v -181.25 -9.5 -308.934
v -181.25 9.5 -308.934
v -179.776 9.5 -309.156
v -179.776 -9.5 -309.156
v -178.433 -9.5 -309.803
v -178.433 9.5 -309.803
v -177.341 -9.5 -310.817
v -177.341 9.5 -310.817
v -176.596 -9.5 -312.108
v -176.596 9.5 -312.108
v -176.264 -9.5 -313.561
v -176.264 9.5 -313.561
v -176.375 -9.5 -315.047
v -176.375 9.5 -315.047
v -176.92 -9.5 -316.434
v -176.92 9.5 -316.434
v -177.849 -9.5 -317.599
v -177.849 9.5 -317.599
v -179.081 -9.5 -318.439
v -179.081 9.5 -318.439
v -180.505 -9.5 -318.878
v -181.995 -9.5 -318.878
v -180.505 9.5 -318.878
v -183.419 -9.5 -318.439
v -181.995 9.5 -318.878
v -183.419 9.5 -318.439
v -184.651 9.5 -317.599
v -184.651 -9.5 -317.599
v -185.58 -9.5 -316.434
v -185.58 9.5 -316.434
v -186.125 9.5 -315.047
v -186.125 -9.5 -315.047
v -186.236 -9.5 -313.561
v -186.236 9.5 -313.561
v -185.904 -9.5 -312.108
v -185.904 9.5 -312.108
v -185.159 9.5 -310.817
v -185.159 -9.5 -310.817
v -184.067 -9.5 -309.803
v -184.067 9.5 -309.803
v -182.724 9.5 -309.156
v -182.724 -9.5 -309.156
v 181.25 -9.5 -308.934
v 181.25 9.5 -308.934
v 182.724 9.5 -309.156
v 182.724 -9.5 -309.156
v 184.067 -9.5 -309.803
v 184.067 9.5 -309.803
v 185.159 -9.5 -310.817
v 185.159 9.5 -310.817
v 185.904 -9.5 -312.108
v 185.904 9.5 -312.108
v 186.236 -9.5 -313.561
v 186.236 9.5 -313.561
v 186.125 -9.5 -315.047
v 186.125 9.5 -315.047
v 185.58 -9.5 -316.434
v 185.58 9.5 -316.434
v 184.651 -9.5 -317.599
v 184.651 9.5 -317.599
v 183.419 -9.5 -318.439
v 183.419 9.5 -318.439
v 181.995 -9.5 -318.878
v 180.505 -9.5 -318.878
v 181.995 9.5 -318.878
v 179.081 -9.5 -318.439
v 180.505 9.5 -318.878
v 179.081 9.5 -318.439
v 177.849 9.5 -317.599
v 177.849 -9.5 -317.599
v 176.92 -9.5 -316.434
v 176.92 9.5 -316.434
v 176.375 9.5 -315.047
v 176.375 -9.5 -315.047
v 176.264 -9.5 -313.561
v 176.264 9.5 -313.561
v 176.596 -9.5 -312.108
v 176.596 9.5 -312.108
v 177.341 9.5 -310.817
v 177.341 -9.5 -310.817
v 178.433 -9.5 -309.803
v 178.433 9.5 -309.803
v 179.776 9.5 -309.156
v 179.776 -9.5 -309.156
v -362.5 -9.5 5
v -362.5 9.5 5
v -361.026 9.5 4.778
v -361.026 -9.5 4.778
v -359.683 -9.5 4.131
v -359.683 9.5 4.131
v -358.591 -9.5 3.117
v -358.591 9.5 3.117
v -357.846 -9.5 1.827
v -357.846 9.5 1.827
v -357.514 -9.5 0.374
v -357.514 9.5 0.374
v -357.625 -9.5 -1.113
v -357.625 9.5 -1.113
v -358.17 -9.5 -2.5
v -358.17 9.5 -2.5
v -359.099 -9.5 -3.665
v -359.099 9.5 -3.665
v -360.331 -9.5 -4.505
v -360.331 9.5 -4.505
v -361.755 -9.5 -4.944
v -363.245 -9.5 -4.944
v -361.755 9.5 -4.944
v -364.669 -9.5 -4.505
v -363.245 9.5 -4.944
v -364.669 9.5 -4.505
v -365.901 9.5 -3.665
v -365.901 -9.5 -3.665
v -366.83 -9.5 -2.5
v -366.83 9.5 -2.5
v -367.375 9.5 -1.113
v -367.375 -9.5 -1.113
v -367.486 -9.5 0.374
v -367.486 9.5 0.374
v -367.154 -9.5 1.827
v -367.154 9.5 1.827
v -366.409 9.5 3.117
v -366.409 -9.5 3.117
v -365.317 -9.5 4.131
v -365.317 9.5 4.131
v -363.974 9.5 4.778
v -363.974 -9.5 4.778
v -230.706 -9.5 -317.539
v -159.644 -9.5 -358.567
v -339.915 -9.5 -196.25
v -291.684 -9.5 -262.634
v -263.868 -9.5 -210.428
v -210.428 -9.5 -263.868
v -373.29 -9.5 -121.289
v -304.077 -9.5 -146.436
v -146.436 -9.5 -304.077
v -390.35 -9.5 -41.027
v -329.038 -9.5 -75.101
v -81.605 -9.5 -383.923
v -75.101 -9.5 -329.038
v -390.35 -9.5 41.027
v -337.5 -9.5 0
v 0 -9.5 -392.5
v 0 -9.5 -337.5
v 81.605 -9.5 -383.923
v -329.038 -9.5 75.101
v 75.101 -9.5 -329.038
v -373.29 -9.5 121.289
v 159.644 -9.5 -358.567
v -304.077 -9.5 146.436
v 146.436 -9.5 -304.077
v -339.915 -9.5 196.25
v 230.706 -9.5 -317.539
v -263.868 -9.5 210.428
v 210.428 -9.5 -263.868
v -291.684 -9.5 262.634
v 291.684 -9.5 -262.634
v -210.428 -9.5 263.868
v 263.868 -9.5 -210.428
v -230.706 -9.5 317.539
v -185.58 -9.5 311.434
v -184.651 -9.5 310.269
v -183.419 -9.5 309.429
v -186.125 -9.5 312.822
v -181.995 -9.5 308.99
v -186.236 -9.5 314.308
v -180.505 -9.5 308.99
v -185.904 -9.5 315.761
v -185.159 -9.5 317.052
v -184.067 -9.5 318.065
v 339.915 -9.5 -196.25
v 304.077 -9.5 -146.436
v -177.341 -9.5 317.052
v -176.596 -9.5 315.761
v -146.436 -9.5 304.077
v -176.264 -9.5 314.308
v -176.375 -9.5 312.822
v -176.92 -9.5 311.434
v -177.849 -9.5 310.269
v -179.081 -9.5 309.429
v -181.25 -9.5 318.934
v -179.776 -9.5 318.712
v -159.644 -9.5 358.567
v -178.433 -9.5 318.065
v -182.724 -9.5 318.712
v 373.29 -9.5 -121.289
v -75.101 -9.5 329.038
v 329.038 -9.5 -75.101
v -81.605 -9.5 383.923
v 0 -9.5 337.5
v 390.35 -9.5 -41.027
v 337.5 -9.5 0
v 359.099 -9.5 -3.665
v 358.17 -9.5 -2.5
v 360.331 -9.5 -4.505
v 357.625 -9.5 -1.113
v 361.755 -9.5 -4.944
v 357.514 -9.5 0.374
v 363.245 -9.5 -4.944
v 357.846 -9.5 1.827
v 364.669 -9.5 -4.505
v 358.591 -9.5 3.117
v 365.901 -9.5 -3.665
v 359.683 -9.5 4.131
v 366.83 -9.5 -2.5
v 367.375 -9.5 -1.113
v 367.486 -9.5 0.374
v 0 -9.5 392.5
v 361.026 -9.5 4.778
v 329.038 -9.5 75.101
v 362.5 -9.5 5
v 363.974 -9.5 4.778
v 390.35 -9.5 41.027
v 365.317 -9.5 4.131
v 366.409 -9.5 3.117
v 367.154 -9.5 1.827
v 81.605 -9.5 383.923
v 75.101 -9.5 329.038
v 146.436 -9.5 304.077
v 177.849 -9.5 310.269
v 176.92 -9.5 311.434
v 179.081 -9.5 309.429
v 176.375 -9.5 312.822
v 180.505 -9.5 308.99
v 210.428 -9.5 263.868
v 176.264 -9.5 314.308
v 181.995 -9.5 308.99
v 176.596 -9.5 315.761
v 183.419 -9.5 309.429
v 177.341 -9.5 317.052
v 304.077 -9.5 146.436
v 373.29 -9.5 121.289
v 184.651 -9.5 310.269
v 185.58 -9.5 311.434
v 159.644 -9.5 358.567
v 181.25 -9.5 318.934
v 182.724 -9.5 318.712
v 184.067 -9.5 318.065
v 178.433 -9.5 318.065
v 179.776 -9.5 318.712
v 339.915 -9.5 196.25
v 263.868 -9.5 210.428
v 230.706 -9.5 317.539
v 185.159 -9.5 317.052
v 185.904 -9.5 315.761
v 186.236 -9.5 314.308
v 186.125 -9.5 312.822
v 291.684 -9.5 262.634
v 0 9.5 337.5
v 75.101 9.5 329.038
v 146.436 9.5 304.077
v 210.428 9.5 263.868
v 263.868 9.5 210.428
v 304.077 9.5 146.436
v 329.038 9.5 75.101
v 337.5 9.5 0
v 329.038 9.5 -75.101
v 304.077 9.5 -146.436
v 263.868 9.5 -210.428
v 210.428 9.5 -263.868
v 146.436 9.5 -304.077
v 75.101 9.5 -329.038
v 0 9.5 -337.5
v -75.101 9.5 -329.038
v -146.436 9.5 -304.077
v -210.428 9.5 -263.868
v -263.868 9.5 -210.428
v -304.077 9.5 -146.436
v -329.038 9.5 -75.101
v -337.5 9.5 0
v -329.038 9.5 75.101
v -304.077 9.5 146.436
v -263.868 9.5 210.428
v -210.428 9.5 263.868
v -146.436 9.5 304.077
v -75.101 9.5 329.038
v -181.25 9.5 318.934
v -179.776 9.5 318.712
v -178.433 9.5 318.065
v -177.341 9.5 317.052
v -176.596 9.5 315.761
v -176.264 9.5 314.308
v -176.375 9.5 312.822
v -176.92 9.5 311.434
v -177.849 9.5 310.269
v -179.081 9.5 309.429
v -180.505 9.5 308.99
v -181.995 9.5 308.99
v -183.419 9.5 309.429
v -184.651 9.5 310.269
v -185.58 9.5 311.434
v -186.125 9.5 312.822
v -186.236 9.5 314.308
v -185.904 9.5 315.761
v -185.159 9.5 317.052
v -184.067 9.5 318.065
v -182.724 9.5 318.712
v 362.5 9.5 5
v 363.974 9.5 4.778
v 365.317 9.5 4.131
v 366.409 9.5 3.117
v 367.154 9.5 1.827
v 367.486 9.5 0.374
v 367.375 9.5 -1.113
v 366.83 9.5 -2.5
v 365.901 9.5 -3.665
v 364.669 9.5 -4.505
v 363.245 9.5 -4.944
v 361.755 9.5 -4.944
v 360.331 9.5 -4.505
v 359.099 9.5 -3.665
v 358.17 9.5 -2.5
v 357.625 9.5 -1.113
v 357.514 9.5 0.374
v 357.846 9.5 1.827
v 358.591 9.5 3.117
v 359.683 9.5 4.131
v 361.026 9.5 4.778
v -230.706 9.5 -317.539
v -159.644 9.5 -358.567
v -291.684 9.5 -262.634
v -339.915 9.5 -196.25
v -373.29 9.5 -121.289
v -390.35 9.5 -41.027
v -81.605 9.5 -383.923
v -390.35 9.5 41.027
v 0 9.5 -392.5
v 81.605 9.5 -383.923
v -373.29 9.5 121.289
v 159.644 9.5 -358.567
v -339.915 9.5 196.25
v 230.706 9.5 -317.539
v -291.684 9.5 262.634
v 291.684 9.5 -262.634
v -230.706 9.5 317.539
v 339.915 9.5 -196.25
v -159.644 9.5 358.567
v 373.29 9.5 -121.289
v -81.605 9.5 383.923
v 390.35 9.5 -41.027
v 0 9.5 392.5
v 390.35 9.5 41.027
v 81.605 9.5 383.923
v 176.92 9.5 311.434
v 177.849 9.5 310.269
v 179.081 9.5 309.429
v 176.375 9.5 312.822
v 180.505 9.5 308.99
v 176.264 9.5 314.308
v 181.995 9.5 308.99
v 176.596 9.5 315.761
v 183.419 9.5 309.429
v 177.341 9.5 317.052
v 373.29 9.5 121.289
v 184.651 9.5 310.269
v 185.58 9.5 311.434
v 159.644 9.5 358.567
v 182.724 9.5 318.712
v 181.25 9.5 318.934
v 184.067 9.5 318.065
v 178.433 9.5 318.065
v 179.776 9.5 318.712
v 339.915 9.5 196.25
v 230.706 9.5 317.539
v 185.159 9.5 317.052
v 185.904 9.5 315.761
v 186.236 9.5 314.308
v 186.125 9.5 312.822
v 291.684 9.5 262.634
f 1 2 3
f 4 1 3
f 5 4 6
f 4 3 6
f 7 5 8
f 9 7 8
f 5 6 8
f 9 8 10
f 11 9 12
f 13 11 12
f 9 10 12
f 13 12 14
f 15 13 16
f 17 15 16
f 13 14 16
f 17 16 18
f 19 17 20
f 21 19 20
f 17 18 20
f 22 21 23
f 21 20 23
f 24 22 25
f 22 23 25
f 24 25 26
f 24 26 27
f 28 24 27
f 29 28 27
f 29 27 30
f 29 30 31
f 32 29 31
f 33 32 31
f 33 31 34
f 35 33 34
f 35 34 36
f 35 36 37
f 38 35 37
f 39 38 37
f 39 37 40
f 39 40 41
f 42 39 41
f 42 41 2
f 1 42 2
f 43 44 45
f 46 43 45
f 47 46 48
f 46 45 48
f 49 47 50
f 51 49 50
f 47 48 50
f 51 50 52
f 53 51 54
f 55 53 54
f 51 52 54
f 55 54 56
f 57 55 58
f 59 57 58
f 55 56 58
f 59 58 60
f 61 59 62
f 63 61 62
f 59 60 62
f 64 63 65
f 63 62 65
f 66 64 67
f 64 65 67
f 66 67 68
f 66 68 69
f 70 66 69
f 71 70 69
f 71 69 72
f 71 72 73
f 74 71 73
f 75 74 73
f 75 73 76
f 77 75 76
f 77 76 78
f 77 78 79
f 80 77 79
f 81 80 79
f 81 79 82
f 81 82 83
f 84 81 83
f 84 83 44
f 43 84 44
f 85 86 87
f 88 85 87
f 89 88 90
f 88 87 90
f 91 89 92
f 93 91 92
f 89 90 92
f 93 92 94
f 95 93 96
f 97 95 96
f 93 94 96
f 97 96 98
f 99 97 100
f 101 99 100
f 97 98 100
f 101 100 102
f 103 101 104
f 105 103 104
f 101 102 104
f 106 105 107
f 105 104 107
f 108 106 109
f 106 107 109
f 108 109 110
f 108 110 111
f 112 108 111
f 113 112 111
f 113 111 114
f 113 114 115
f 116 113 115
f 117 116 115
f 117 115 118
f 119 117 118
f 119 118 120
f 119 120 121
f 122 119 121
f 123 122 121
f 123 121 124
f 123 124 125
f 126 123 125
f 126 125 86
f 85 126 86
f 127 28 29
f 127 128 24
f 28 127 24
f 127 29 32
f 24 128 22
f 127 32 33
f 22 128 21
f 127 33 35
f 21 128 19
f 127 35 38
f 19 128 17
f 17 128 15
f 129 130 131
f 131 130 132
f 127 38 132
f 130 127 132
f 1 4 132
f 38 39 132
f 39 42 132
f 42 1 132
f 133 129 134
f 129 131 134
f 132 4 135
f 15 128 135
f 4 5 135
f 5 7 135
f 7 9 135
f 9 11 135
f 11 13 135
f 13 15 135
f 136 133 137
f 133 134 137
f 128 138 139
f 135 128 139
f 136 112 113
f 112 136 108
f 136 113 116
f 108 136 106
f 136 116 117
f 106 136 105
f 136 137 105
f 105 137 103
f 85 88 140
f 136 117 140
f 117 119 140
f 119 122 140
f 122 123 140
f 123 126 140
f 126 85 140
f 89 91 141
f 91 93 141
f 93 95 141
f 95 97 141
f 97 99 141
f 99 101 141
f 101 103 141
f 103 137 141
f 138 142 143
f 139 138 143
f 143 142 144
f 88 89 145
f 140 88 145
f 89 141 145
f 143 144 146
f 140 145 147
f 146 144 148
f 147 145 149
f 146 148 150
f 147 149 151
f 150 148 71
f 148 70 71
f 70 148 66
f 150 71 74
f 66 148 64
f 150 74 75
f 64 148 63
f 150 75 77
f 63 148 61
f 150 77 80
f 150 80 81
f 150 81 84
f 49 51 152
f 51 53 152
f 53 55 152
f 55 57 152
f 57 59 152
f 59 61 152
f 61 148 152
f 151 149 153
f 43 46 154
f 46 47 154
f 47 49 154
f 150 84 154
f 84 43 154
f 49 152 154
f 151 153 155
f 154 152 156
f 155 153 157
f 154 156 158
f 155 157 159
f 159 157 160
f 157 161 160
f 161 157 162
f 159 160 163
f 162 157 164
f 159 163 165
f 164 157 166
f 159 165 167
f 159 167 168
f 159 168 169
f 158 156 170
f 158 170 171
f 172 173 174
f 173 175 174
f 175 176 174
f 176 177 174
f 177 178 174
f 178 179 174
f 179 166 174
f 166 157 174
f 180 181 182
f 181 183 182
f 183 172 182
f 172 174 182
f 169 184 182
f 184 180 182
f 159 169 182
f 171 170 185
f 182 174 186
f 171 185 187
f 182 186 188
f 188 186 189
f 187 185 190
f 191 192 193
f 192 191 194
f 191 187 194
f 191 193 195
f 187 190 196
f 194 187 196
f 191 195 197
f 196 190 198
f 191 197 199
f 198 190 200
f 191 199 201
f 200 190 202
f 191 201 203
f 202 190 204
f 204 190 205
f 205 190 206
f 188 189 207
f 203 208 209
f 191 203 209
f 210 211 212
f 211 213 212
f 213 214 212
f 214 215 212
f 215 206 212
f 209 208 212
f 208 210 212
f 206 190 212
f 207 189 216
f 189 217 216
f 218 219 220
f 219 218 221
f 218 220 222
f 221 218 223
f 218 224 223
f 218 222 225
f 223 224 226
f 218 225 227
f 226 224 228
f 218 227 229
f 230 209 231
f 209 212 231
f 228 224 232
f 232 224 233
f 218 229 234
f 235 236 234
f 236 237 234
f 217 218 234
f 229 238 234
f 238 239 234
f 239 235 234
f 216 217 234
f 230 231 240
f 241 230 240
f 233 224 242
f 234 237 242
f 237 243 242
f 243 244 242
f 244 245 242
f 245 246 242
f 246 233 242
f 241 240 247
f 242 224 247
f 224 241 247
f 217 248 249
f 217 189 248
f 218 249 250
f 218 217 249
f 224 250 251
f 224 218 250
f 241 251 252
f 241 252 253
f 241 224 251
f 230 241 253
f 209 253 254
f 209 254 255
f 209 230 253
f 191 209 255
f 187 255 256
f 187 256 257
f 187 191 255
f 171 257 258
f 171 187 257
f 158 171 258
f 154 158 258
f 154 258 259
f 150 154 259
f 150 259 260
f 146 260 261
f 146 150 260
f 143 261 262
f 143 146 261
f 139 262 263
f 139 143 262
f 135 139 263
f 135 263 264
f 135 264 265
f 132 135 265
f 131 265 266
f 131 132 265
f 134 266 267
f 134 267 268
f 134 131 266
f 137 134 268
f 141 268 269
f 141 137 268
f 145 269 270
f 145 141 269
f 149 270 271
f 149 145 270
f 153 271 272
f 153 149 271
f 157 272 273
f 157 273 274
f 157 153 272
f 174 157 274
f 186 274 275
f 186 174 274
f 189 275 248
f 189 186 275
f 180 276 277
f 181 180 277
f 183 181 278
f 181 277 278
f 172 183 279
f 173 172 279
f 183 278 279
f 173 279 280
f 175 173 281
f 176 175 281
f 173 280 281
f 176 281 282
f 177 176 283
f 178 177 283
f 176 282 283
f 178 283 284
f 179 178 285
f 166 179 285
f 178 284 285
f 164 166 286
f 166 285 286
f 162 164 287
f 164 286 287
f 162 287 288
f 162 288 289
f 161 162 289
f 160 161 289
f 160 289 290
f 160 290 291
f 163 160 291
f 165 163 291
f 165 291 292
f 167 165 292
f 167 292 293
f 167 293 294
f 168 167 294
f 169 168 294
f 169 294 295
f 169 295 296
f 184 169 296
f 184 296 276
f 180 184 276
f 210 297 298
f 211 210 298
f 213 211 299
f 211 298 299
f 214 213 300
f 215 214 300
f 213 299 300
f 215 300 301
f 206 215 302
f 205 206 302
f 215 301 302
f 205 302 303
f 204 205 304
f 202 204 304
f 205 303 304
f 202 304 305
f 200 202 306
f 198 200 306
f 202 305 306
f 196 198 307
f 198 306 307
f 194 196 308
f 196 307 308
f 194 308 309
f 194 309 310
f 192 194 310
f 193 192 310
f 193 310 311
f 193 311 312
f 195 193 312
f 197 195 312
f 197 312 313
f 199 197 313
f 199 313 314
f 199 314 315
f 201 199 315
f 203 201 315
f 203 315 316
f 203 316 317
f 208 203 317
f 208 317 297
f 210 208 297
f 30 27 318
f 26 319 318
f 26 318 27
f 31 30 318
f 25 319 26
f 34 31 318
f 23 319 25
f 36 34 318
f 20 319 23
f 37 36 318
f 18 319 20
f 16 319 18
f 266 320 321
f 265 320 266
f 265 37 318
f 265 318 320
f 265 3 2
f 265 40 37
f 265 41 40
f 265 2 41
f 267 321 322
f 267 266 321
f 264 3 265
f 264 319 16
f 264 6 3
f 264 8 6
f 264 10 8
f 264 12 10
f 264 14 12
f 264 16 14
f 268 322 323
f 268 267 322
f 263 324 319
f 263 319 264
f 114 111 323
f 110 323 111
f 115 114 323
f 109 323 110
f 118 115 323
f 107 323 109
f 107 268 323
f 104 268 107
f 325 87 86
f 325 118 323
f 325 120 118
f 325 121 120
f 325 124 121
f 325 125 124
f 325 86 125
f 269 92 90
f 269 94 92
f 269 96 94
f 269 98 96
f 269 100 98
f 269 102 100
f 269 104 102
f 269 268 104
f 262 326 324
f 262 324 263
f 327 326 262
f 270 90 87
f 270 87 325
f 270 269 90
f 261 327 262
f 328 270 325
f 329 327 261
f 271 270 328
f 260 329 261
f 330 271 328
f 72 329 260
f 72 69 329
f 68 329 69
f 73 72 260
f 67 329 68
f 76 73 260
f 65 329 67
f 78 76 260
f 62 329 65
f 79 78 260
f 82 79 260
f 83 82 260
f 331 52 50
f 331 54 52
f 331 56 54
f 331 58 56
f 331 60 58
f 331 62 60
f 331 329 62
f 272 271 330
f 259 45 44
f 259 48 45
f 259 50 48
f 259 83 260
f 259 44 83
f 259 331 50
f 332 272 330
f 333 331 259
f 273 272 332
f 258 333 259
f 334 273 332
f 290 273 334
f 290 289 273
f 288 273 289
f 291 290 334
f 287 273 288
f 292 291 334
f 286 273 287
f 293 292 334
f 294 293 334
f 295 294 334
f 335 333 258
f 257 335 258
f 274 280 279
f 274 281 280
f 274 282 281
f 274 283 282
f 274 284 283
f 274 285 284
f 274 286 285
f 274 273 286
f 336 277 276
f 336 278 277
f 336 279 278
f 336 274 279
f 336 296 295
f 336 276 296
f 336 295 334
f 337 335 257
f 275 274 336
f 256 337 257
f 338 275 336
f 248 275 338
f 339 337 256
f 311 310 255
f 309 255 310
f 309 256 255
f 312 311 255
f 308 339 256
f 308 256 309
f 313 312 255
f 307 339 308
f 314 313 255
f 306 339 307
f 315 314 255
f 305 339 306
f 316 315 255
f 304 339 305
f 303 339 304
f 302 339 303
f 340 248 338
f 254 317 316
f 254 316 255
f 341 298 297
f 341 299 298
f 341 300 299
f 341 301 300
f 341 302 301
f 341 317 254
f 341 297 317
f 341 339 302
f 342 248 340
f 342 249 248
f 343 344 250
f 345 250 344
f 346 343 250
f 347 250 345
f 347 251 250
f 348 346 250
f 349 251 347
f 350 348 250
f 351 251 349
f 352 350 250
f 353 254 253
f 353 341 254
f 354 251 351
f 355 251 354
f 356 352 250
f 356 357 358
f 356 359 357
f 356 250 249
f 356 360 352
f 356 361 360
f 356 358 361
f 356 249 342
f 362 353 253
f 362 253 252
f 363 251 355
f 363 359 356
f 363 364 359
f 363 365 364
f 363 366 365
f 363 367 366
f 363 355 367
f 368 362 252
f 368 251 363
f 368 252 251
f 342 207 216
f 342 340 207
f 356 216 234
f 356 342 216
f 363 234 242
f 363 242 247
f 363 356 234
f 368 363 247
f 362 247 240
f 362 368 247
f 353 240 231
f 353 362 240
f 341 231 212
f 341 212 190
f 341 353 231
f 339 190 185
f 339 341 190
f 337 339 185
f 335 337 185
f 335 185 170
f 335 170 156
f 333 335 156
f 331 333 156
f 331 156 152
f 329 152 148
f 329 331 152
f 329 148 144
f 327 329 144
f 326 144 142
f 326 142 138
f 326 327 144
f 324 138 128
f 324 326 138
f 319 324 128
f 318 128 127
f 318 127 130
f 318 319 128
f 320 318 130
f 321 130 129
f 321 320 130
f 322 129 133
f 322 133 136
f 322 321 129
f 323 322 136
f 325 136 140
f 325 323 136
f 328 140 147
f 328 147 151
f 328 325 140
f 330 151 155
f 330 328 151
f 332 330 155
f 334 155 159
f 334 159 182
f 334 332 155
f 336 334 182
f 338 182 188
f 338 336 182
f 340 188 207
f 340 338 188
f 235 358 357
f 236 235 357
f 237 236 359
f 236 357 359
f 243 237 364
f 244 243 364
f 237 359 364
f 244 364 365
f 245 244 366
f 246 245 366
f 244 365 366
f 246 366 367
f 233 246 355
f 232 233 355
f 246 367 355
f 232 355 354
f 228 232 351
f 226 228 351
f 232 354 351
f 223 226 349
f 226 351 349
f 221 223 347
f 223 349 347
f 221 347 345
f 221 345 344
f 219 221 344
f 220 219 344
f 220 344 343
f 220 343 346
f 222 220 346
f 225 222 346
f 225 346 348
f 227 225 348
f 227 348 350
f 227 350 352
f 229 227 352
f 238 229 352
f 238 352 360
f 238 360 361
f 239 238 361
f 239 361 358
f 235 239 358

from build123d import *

# Parameters (mm, degrees)
SKETCH1_R           = 392.5
SKETCH1_R_2         = 337.5
BOSS_EXTRUDE1_DEPTH = 9.5
SKETCH2_R           = 5
CUT_EXTRUDE1_DEPTH  = 556.40390708


with BuildPart() as part:
    # Sketch1 → Boss-Extrude1 (new, symmetric)
    with BuildSketch(Plane(origin=(0, 0, 0), x_dir=(1, 0, 0), z_dir=(0, 1, 0))):
        with Locations(Location((0, 0, 0), (0, 0, 270))):
            Circle(SKETCH1_R)
        with Locations(Location((0, 0, 0), (0, 0, 270))):
            Circle(SKETCH1_R_2, mode=Mode.SUBTRACT)
    extrude(amount=BOSS_EXTRUDE1_DEPTH, both=True)

    # Sketch2 → Cut-Extrude1 (cut, through all)
    with BuildSketch(Plane(origin=(0, 9.5, 0), x_dir=(1, 0, 0), z_dir=(0, 1, 0))):
        with Locations(Location((181.25, 313.934208872, 0), (0, 0, 270))):
            Circle(SKETCH2_R)
        with Locations(Location((362.5, 0, 0), (0, 0, 270))):
            Circle(SKETCH2_R)
        with Locations(Location((181.25, -313.934208872, 0), (0, 0, 270))):
            Circle(SKETCH2_R)
        with Locations(Location((-181.25, -313.934208872, 0), (0, 0, 270))):
            Circle(SKETCH2_R)
        with Locations(Location((-362.5, 0, 0), (0, 0, 270))):
            Circle(SKETCH2_R)
        with Locations(Location((-181.25, 313.934208872, 0), (0, 0, 270))):
            Circle(SKETCH2_R)
    extrude(amount=-CUT_EXTRUDE1_DEPTH, mode=Mode.SUBTRACT)


solid = part.part
